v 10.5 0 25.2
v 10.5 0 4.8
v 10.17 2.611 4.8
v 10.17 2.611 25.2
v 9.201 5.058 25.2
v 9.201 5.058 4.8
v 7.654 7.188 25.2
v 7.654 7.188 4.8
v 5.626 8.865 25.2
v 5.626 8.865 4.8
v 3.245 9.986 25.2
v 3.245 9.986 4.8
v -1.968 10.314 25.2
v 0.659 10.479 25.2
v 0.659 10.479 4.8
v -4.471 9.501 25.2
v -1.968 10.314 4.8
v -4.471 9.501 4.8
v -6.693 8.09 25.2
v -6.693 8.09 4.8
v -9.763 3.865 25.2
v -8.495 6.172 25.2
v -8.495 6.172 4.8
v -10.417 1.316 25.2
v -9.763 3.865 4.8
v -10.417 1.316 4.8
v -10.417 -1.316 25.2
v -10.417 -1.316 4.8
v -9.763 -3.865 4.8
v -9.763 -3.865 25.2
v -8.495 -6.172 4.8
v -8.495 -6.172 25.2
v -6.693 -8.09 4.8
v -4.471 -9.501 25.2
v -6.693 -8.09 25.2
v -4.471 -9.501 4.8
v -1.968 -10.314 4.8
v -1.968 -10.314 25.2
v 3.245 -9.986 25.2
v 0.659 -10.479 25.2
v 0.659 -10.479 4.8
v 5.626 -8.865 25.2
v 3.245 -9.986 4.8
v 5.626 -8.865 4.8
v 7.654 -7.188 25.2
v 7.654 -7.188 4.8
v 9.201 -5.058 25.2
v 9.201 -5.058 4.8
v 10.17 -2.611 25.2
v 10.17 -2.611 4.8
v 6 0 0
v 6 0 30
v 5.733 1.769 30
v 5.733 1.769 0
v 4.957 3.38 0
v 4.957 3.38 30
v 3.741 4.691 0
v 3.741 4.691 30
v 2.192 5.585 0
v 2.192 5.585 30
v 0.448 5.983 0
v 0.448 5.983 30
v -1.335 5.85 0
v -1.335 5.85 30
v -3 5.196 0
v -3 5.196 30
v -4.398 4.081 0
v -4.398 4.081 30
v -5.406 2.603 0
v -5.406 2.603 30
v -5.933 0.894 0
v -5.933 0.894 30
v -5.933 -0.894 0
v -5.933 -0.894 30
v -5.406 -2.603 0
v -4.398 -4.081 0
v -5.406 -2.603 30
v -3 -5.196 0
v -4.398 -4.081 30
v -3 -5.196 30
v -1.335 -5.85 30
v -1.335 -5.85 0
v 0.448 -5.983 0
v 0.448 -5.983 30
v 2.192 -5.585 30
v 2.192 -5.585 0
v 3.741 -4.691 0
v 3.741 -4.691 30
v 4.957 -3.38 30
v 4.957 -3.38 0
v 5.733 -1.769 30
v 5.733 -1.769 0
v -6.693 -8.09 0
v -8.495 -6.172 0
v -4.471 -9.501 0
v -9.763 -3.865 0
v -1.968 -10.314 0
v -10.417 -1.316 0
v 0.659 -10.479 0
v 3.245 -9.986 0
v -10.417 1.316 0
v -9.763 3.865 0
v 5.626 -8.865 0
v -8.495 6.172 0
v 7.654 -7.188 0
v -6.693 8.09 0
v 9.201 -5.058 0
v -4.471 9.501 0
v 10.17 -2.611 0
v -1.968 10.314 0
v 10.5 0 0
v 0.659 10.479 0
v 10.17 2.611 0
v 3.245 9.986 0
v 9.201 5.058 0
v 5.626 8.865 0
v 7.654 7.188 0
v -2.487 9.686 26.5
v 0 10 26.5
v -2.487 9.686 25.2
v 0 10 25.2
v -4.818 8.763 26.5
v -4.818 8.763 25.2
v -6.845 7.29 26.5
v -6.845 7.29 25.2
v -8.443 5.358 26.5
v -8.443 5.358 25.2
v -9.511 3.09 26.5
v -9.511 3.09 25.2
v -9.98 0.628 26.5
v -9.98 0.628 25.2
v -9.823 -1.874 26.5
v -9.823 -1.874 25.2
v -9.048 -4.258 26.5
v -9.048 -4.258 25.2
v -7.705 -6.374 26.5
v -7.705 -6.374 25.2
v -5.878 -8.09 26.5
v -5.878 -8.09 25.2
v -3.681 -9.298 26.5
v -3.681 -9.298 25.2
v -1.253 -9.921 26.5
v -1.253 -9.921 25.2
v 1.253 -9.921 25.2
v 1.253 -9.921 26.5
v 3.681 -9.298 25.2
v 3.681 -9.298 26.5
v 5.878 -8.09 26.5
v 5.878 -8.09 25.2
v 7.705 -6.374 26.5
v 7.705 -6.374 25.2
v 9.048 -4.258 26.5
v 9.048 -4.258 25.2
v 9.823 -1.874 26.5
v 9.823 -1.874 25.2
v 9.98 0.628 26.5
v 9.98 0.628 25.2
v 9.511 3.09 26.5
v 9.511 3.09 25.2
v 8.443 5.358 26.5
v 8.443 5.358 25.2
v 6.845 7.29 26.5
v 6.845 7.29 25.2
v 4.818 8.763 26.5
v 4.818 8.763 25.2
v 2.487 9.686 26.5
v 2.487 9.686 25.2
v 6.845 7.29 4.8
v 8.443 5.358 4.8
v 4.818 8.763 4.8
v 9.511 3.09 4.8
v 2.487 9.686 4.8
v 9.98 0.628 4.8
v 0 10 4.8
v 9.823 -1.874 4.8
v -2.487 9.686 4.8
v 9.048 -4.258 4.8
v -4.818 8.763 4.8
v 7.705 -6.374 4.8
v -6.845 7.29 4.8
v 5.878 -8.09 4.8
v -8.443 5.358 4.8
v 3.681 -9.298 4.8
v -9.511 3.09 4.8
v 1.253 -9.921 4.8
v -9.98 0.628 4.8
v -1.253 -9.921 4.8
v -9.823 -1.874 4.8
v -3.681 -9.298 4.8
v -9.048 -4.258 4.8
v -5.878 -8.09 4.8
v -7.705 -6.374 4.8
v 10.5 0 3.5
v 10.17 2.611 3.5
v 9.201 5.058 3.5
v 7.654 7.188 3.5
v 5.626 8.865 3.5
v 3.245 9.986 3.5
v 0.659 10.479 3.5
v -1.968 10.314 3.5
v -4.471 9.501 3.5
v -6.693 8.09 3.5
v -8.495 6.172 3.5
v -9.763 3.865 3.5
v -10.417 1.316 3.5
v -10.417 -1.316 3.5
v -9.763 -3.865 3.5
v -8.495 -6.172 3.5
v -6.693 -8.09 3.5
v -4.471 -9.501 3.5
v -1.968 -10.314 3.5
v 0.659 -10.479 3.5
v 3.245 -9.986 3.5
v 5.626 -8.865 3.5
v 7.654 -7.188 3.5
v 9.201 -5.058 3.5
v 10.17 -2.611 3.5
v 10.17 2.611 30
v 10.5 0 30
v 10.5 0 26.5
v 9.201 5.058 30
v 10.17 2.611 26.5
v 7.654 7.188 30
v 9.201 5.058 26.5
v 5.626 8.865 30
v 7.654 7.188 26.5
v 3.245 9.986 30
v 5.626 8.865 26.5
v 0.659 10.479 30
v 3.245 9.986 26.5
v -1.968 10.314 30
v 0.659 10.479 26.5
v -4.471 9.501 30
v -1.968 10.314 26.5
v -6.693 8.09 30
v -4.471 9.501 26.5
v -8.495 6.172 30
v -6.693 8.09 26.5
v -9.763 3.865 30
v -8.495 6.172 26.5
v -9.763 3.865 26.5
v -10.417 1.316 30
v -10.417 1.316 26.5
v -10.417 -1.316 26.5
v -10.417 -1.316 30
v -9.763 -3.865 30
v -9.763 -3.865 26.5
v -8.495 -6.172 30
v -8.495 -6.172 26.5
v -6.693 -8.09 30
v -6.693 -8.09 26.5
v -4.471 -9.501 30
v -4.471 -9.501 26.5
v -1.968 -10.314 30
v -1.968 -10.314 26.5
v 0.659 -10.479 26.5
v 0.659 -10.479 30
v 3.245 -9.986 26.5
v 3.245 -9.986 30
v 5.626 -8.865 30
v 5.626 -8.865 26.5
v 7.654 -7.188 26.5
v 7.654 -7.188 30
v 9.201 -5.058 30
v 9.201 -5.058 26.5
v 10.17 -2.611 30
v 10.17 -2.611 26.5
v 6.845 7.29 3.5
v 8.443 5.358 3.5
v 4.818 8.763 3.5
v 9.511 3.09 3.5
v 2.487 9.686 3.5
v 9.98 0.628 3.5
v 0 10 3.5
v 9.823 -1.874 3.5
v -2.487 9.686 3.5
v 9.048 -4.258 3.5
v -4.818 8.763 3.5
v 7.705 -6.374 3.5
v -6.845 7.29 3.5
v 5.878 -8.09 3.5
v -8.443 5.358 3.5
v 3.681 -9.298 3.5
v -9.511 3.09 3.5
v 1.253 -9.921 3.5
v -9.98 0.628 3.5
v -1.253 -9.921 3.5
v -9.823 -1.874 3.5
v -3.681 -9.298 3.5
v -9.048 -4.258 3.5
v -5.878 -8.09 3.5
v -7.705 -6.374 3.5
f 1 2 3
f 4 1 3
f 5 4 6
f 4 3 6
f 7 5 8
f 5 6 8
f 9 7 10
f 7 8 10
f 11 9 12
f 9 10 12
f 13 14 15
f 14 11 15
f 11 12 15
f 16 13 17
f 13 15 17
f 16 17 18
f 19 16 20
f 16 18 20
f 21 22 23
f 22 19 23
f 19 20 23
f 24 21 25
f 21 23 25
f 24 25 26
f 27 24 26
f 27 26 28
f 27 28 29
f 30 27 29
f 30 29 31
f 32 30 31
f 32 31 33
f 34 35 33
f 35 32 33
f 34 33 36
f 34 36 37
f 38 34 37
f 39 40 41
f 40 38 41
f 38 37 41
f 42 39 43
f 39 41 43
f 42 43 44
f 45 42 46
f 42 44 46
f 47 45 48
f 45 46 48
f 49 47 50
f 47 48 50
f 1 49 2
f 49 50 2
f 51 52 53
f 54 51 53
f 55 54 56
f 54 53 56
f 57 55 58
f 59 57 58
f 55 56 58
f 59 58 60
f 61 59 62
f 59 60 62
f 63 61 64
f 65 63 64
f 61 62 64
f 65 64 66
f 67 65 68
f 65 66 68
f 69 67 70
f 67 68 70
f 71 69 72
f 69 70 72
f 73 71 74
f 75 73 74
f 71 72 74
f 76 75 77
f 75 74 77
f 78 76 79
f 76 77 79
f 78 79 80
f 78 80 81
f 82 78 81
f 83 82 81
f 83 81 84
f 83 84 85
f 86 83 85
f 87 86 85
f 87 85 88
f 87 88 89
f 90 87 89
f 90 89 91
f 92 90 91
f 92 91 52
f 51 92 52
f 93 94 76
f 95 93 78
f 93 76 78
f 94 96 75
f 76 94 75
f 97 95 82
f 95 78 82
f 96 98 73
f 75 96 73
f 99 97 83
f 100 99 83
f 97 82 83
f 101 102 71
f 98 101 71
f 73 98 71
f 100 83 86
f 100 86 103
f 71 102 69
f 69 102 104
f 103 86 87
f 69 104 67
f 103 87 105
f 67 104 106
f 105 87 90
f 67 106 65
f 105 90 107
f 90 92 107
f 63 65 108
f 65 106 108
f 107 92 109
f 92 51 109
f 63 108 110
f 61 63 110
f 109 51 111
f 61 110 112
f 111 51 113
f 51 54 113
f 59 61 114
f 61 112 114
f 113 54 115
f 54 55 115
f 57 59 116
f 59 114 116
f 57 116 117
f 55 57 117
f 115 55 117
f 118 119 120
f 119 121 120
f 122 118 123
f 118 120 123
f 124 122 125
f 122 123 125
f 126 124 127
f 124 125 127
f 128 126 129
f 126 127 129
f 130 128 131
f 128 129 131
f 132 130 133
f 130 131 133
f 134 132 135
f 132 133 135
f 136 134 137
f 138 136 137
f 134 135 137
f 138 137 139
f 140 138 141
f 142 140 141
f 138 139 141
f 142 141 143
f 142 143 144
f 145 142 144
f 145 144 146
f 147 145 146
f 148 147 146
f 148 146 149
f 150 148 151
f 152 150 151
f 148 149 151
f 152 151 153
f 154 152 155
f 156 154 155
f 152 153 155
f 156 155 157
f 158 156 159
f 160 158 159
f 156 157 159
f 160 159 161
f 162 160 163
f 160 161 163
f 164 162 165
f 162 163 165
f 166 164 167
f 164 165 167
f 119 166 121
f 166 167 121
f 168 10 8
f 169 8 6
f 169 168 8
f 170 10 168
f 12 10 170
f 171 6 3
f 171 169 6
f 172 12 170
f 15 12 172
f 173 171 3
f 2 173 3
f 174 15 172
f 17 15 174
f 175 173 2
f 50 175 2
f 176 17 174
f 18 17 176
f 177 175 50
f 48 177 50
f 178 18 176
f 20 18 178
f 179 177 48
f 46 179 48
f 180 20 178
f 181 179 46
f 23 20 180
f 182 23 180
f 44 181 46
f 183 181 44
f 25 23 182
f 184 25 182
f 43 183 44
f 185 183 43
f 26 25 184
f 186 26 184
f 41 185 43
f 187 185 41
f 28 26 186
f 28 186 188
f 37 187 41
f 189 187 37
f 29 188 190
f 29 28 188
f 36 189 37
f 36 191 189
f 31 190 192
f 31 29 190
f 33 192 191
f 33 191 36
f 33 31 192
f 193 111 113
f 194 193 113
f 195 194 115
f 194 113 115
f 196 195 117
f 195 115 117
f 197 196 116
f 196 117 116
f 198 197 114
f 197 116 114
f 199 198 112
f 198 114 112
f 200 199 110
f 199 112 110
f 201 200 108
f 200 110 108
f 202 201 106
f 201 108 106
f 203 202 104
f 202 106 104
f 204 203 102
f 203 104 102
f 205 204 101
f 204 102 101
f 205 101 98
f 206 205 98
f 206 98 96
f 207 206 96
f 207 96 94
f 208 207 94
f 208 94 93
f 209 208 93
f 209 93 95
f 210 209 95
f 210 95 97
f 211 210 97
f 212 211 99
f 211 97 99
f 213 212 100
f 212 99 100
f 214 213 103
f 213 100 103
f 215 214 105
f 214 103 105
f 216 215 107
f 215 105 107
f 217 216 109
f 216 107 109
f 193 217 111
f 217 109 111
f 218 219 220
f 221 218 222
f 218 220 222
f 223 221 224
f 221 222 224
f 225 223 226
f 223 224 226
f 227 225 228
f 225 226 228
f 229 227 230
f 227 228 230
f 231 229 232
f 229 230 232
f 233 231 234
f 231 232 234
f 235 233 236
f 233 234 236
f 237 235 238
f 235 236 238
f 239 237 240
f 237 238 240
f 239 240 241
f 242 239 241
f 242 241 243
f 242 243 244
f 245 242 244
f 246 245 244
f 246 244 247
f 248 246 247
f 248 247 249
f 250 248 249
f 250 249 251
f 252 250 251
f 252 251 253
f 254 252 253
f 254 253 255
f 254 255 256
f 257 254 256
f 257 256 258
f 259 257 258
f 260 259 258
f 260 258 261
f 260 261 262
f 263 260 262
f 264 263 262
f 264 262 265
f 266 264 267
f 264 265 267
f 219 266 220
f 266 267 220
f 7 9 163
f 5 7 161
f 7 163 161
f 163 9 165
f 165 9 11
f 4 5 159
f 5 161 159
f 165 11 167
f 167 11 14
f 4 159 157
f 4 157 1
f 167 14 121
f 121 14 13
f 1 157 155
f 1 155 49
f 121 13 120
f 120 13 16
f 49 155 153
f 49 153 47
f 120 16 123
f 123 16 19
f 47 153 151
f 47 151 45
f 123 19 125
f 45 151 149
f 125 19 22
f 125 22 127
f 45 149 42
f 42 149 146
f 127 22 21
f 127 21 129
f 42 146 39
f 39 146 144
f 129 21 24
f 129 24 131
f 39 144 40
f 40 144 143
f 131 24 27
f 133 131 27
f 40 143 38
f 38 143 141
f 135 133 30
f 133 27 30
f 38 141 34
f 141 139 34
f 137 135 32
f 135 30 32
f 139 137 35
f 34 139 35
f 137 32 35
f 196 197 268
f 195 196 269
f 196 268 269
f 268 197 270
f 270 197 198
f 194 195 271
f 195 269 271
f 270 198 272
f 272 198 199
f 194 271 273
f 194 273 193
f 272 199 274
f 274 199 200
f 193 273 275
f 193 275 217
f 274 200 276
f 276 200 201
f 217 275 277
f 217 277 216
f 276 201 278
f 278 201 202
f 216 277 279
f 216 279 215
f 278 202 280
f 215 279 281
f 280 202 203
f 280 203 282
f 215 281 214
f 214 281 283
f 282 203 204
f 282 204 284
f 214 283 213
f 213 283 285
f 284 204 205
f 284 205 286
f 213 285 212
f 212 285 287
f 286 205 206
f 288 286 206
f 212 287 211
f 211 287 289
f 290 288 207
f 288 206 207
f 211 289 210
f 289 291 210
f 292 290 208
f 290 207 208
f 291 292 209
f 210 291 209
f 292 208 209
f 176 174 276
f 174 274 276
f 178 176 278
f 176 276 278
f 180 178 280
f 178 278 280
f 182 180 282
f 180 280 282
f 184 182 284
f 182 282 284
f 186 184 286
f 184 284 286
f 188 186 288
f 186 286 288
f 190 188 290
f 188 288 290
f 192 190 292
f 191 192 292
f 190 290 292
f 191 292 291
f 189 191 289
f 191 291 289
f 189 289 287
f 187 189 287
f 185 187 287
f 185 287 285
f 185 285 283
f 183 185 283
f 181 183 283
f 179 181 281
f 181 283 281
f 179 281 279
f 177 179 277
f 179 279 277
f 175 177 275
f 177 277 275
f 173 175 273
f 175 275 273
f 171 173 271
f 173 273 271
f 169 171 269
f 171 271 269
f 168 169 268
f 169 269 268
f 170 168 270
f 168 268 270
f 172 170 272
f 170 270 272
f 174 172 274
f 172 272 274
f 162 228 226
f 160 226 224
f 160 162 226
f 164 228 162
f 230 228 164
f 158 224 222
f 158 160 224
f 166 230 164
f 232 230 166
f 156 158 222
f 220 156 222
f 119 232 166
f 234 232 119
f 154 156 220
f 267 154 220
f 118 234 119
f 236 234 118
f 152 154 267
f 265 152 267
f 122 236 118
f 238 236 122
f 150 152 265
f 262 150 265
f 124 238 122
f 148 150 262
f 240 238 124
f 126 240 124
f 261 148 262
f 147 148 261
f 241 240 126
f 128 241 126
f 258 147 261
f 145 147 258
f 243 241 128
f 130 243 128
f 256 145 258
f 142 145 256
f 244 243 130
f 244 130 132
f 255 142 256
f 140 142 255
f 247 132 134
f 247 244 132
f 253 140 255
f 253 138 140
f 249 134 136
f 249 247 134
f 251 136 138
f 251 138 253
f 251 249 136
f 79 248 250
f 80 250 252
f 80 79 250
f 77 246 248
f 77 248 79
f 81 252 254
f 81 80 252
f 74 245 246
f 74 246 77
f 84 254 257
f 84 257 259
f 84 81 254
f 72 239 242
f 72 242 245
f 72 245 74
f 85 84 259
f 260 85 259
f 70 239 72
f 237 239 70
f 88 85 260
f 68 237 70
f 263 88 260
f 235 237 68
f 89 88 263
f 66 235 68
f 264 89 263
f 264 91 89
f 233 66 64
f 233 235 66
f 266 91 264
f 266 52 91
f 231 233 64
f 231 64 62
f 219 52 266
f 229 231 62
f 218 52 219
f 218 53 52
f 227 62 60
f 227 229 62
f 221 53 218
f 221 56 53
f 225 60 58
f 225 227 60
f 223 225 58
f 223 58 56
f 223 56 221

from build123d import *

# Parameters (mm, degrees)
ESBO_O1_R                  = 10.5
RESSALTO_EXTRUS_O1_DEPTH   = 30
ESBO_O2_R                  = 6
CORTE_EXTRUS_O1_DEPTH      = 1
CORTE_EXTRUS_O1_DEPTH_BACK = 31
ESBO_O4_W                  = 1.3
ESBO_O4_H                  = 0.5


with BuildPart() as part:
    # Esboço1 → Ressalto-extrusão1 (new body)
    with BuildSketch(Plane.XY):
        Circle(ESBO_O1_R)
    extrude(amount=RESSALTO_EXTRUS_O1_DEPTH)

    # Esboço2 → Corte-extrusão1 (cut, two sides)
    with BuildSketch(Plane.XY.offset(30)) as corte_extrus_o1_sk:
        Circle(ESBO_O2_R)
    extrude(amount=CORTE_EXTRUS_O1_DEPTH, mode=Mode.SUBTRACT)
    extrude(corte_extrus_o1_sk.sketch, amount=-CORTE_EXTRUS_O1_DEPTH_BACK, mode=Mode.SUBTRACT)

    # Esboço4 → Corte-Revolução1 (revolve, cut)
    with BuildSketch(Plane(origin=(0, 0, 0), x_dir=(0, 0, -1), z_dir=(1, 0, 0))):
        with Locations((-25.85, 10.25)):
            Rectangle(ESBO_O4_W, ESBO_O4_H)
        with Locations((-4.15, 10.25)):
            Rectangle(ESBO_O4_W, ESBO_O4_H)
    revolve(axis=Axis((0, 0, -1.457000242), (0, 0, 1)), mode=Mode.SUBTRACT)


solid = part.part
